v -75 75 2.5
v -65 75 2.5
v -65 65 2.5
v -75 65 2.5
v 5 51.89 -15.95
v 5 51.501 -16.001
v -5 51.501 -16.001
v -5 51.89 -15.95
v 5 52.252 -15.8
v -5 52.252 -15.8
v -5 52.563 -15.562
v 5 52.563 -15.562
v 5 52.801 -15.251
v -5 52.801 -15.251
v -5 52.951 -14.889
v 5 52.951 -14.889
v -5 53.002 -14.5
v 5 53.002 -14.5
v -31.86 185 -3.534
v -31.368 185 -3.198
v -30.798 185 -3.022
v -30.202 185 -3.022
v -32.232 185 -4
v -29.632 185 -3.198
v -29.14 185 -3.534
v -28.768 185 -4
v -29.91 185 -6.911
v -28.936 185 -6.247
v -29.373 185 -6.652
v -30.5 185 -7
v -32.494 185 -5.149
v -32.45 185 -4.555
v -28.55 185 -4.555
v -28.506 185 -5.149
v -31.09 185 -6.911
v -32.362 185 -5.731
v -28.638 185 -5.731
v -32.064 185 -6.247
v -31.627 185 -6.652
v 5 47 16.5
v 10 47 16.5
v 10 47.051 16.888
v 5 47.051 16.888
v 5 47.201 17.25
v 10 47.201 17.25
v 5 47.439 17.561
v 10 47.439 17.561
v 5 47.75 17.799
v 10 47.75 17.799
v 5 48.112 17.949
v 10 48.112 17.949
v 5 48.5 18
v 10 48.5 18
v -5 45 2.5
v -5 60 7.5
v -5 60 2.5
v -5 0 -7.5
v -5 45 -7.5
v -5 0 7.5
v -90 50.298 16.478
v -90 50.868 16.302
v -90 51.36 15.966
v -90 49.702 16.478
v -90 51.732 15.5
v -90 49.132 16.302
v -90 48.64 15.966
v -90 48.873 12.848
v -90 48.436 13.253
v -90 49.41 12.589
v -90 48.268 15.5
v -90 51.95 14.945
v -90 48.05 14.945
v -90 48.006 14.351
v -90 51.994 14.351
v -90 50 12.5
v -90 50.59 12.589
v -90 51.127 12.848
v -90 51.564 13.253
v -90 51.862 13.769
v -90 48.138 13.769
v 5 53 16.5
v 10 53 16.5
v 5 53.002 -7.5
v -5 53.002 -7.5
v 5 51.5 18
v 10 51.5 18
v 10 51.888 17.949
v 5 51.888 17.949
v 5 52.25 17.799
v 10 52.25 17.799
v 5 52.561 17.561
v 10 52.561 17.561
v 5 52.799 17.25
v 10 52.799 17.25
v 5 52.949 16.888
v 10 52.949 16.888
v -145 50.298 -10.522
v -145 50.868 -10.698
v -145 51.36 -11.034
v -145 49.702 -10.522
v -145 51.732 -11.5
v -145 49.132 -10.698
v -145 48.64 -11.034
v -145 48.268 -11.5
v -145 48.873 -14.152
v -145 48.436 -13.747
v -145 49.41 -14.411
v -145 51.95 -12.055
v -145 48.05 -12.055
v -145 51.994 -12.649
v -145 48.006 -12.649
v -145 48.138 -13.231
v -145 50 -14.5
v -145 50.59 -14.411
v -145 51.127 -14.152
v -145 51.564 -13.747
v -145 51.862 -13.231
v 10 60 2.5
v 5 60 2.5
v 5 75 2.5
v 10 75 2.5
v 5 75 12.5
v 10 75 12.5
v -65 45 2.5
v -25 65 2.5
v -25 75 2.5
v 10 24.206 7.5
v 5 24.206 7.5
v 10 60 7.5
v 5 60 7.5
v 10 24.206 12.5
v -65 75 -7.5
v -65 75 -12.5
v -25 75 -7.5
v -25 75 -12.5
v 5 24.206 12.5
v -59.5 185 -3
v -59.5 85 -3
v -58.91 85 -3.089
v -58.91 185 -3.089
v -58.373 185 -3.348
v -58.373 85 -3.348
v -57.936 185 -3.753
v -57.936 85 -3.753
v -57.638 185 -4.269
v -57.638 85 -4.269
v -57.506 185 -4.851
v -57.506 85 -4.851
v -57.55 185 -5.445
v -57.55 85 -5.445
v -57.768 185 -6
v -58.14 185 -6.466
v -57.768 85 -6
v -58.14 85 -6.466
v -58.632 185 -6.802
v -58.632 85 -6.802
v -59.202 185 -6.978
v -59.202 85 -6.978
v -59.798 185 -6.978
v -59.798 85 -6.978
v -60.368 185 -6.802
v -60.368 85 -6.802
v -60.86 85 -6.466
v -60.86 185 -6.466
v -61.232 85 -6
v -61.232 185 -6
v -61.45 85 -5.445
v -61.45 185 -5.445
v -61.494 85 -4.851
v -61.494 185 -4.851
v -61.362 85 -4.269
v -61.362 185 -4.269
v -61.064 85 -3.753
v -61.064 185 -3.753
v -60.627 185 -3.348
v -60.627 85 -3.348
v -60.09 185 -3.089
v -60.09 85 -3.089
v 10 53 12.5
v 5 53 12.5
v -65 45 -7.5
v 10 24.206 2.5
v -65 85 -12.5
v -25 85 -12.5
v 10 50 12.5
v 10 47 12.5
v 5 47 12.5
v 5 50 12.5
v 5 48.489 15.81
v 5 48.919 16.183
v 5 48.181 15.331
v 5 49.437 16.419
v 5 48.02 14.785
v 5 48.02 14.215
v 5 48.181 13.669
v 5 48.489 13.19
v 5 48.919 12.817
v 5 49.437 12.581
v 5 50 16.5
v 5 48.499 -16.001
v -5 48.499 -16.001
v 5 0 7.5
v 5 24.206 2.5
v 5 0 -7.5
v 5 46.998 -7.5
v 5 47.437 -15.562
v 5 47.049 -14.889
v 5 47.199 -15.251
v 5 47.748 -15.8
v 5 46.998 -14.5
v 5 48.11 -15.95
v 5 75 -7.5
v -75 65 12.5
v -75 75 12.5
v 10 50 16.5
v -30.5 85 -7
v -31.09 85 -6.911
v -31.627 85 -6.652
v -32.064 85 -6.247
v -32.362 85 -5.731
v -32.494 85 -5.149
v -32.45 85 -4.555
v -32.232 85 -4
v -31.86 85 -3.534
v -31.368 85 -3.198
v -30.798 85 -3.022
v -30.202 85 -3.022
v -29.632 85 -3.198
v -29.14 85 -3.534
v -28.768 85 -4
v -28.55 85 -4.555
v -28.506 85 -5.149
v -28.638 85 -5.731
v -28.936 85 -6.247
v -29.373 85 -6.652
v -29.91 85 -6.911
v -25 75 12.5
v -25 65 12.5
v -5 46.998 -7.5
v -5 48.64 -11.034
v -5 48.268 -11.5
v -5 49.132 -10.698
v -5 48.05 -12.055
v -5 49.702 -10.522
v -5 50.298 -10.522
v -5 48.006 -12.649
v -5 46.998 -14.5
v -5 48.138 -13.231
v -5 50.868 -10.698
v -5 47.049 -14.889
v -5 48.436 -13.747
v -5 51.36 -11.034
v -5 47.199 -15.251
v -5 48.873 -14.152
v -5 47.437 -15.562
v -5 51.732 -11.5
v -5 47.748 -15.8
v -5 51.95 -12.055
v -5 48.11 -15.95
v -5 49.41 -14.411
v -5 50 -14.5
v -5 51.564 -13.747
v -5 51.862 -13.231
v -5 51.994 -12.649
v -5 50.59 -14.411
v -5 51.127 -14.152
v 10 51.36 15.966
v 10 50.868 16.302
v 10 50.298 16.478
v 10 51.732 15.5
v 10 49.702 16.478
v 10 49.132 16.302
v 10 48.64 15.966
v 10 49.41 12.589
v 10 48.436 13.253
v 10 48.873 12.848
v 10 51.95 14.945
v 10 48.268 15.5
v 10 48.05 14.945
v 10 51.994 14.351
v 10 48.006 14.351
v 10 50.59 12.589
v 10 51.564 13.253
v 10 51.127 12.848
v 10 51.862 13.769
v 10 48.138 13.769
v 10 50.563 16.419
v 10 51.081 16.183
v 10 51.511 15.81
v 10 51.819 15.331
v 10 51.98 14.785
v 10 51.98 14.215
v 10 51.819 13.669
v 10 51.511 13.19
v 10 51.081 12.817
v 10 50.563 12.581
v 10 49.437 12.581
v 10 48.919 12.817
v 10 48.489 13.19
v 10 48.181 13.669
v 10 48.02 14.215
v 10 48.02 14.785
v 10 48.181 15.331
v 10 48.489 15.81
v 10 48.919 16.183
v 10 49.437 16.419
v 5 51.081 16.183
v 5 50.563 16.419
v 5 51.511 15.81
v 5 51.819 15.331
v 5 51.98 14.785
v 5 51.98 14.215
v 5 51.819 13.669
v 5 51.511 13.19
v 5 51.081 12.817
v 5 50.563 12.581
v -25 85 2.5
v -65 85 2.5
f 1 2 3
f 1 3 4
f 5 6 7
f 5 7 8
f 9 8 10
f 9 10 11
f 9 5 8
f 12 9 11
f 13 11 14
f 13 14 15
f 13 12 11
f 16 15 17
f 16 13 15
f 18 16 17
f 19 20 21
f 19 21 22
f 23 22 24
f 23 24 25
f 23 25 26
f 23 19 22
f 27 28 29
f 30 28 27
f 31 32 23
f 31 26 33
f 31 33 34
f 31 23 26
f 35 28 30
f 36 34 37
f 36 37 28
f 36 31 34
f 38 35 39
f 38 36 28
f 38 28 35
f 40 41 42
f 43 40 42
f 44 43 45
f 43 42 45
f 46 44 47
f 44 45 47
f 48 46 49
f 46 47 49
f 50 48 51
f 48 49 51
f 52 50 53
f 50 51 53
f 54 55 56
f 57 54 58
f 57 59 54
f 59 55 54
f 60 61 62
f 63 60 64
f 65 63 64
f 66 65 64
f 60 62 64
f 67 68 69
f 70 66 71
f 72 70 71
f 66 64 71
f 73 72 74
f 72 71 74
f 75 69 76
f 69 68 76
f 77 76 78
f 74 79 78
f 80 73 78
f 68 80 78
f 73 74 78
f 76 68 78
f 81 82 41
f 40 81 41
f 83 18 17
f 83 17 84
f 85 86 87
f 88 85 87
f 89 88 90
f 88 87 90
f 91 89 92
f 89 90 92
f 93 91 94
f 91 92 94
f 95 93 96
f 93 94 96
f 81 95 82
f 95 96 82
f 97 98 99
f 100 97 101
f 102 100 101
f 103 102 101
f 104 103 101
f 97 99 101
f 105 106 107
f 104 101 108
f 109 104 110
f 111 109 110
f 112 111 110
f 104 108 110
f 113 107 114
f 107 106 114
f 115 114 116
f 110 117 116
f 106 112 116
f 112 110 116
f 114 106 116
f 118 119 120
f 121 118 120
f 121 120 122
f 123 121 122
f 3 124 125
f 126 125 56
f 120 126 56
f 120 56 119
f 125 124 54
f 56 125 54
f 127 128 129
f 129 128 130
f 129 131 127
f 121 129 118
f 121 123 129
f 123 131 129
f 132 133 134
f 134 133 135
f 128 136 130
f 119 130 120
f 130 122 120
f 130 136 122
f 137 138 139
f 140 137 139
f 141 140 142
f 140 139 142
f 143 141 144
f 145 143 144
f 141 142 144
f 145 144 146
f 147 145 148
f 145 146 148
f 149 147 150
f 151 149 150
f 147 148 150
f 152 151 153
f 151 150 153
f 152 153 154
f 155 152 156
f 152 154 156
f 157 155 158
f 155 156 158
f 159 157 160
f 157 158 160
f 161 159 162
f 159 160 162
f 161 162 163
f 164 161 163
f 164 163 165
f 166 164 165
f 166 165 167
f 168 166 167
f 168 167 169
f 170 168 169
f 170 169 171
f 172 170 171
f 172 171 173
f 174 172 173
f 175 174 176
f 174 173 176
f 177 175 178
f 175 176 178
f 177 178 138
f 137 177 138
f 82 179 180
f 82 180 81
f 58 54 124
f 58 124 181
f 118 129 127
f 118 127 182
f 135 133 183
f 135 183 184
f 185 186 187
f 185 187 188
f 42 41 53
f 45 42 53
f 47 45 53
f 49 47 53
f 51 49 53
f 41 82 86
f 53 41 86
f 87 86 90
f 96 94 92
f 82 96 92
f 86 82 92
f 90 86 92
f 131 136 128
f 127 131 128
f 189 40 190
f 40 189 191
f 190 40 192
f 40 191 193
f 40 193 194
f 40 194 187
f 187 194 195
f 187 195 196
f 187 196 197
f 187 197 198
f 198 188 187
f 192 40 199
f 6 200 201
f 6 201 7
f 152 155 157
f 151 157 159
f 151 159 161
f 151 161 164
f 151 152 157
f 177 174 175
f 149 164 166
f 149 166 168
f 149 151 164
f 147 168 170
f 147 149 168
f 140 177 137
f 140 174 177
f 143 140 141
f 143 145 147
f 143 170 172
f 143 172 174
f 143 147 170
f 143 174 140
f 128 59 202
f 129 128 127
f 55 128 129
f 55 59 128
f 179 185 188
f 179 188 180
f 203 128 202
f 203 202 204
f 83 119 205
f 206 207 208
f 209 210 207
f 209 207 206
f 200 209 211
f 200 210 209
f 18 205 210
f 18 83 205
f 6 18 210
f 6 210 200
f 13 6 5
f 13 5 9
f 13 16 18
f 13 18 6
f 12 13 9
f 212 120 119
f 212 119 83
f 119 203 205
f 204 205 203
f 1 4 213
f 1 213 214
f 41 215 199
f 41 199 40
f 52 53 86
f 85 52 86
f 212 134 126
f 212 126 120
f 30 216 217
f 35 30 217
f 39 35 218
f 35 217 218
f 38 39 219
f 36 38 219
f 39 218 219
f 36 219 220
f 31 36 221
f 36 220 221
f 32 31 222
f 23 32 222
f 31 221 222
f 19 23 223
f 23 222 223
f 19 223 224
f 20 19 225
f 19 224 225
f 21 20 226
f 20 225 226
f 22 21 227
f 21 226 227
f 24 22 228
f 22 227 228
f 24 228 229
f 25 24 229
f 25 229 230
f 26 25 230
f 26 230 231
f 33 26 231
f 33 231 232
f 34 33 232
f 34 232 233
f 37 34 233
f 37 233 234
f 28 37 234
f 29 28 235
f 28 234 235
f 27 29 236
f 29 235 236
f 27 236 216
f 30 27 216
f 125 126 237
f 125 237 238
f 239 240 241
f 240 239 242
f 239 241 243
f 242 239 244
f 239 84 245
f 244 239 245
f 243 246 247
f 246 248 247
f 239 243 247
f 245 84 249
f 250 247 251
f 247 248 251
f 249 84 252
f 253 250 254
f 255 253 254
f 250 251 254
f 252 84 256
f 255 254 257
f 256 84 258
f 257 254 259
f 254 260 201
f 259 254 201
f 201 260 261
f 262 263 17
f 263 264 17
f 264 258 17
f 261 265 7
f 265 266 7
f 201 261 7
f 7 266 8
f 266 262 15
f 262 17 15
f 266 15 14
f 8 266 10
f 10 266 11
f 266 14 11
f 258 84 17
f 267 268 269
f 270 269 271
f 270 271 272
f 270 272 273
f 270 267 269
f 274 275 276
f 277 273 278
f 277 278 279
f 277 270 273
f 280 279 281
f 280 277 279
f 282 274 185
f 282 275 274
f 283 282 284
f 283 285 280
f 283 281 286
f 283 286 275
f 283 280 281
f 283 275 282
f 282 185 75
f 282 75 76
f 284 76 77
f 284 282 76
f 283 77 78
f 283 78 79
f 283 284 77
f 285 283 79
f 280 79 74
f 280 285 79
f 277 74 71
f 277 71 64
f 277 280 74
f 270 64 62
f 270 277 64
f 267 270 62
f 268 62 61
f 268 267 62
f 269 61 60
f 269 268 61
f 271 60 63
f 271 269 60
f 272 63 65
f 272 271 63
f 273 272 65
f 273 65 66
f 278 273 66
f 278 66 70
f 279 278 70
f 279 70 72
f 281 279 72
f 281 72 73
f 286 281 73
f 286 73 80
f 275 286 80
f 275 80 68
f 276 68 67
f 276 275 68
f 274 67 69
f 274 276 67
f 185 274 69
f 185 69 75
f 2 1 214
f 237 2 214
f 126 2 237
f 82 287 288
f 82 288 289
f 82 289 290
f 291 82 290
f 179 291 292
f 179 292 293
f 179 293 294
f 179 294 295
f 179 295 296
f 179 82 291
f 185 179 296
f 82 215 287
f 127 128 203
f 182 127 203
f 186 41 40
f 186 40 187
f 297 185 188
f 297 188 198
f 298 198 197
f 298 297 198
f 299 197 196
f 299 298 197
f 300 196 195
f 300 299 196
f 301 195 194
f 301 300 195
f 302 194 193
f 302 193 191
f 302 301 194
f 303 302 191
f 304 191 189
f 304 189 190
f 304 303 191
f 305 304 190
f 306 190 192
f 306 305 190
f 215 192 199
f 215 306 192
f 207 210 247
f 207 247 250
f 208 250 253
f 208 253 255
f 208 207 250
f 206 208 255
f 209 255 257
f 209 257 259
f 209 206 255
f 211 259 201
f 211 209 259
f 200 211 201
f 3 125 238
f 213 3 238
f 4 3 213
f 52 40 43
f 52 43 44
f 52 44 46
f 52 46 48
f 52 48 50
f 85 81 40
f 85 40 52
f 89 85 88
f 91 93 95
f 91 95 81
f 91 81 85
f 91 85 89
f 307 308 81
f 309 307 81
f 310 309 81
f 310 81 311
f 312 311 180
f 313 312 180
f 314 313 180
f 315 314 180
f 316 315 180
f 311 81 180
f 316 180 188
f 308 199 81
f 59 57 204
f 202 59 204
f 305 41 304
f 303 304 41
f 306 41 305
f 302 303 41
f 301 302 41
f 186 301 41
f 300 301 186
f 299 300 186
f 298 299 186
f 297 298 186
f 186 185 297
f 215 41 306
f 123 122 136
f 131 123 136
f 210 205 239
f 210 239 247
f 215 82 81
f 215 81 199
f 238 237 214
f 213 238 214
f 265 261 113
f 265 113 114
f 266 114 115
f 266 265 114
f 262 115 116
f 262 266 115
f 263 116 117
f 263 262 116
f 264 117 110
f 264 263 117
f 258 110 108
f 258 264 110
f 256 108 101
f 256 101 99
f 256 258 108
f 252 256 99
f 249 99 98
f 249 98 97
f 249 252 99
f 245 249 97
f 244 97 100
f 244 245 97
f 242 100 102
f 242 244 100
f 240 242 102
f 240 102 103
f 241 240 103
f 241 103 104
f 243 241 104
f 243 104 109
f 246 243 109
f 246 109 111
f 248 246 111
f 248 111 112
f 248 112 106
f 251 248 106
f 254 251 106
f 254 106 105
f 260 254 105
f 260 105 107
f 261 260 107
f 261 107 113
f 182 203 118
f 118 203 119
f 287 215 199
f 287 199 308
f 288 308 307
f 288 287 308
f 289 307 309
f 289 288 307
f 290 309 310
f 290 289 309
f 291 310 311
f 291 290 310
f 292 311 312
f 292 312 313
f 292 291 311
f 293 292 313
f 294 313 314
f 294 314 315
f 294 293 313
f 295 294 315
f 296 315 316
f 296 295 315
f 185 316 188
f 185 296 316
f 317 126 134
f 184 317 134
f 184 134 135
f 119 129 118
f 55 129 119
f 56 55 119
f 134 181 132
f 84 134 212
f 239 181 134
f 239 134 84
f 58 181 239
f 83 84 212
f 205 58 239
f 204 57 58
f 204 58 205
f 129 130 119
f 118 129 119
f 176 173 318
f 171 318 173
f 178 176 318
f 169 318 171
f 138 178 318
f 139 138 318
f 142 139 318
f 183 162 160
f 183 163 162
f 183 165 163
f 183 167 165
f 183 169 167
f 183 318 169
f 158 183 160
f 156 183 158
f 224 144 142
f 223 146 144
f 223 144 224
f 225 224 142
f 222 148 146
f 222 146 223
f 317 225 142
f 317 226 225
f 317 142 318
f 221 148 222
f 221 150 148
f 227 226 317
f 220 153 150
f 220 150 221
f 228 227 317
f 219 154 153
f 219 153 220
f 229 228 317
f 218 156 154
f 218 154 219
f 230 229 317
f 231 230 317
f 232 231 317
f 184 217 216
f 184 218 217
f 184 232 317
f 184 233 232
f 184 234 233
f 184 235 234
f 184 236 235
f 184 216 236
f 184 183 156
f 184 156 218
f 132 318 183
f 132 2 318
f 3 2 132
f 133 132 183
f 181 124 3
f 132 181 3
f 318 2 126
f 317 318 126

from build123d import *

# Parameters (mm, degrees)
SKETCH1_W              = 10
SKETCH1_H              = 15
BOSS_EXTRUDE1_DEPTH    = 60
SKETCH2_W              = 10
SKETCH2_H              = 15
BOSS_EXTRUDE2_DEPTH    = 60
SKETCH3_W              = 70
SKETCH3_H              = 10
BOSS_EXTRUDE3_DEPTH    = 15
SKETCH6_W              = 40
SKETCH6_H              = 15
BOSS_EXTRUDE4_DEPTH    = 10
SKETCH7_R              = 2
BOSS_EXTRUDE5_DEPTH    = 100
BOSS_EXTRUDE6_DEPTH    = 10
SKETCH10_W             = 5
SKETCH10_H             = 35.794380654
BOSS_EXTRUDE12_DEPTH   = 5
BOSS_EXTRUDE15_DEPTH   = 5
SKETCH19_R             = 2
BOSS_EXTRUDE18_DEPTH   = 150
BOSS_EXTRUDE19_DEPTH   = 10
SKETCH26_R             = 2
BOSS_EXTRUDE22_DEPTH   = 100
BOSS_EXTRUDE31_DEPTH   = 5
BOSS_EXTRUDE31_2_DEPTH = 5
BOSS_EXTRUDE33_DEPTH   = 5


with BuildPart() as part:
    # Sketch1 → Boss-Extrude1 (new body)
    with BuildSketch(Plane(origin=(0, 0, 0), x_dir=(1, 0, 0), z_dir=(0, 1, 0))):
        Rectangle(SKETCH1_W, SKETCH1_H)
    extrude(amount=BOSS_EXTRUDE1_DEPTH)

    # Sketch2 → Boss-Extrude2 (add)
    with BuildSketch(Plane(origin=(-5, 0, 0), x_dir=(0, 0, -1), z_dir=(1, 0, 0))):
        with Locations((2.5, 52.5)):
            Rectangle(SKETCH2_W, SKETCH2_H)
    extrude(amount=-BOSS_EXTRUDE2_DEPTH)

    # Sketch3 → Boss-Extrude3 (add)
    with BuildSketch(Plane(origin=(0, 60, 0), x_dir=(1, 0, 0), z_dir=(0, 1, 0))):
        with Locations((-30, 2.5)):
            Rectangle(SKETCH3_W, SKETCH3_H)
    extrude(amount=BOSS_EXTRUDE3_DEPTH)

    # Sketch6 → Boss-Extrude4 (add)
    with BuildSketch(Plane(origin=(0, 75, 0), x_dir=(1, 0, 0), z_dir=(0, 1, 0))):
        with Locations((-45, 5)):
            Rectangle(SKETCH6_W, SKETCH6_H)
    extrude(amount=BOSS_EXTRUDE4_DEPTH)

    # Sketch7 → Boss-Extrude5 (add)
    with BuildSketch(Plane(origin=(0, 85, 0), x_dir=(1, 0, 0), z_dir=(0, 1, 0))):
        with Locations(Location((-30.5, 5, 0), (0, 0, 90))):
            Circle(SKETCH7_R)
        with Locations(Location((-59.5, 5, 0), (0, 0, 270))):
            Circle(SKETCH7_R)
    extrude(amount=BOSS_EXTRUDE5_DEPTH)

    # Sketch8 → Boss-Extrude6 (add)
    with BuildSketch(Plane(origin=(5, 75, 2.5), x_dir=(-1, 0, 0), z_dir=(0, 0, -1))):
        Polygon((30, 0), (30, -10), (70, -10), (80, -10), (80, 0), align=None)
    extrude(amount=-BOSS_EXTRUDE6_DEPTH)

    # Sketch10 → Boss-Extrude12 (add)
    with BuildSketch(Plane(origin=(5, 0, 0), x_dir=(0, 0, -1), z_dir=(1, 0, 0))):
        with Locations((-5, 42.102809673)):
            Rectangle(SKETCH10_W, SKETCH10_H)
    extrude(amount=BOSS_EXTRUDE12_DEPTH)



with BuildPart() as body_2:
    # Sketch11 → Boss-Extrude15 (new body)
    with BuildSketch(Plane(origin=(5, 0, 0), x_dir=(0, 0, -1), z_dir=(1, 0, 0))):
        Polygon((-2.5, 60), (-2.5, 75), (-12.5, 75), (-12.5, 24.205619346), (-7.5, 24.205619346), (-7.5, 60), align=None)
    extrude(amount=BOSS_EXTRUDE15_DEPTH)


with BuildPart() as body_3:
    # Sketch19 → Boss-Extrude18 (new body)
    with BuildSketch(Plane(origin=(5, 0, 0), x_dir=(0, 0, -1), z_dir=(1, 0, 0))):
        with Locations((12.5, 50)):
            Circle(SKETCH19_R)
    extrude(amount=-BOSS_EXTRUDE18_DEPTH)


with BuildPart() as part_1:
    add(part.part)

    add(body_3.part)  # Boss-Extrude19 merges body 3
    # Sketch20 → Boss-Extrude19 (add)
    with BuildSketch(Plane(origin=(5, 0, 0), x_dir=(0, 0, -1), z_dir=(1, 0, 0))):
        with BuildLine():
            Line((12.5, 53.002424106), (7.5, 53.002424106))
            Line((7.5, 53.002424106), (7.5, 50))
            Line((7.5, 50), (7.5, 46.997575894))
            Line((7.5, 46.997575894), (12.5, 46.997575894))
            Line((12.5, 46.997575894), (14.5, 46.997575894))
            ThreePointArc((14.5, 46.997575894), (15.561517223, 47.437270724), (16.001212053, 48.498787947))
            Line((16.001212053, 48.498787947), (16.001212053, 51.501212053))
            ThreePointArc((16.001212053, 51.501212053), (15.561517223, 52.562729276), (14.5, 53.002424106))
            Line((14.5, 53.002424106), (12.5, 53.002424106))
        make_face()
    extrude(amount=-BOSS_EXTRUDE19_DEPTH)


with BuildPart() as body_3_2:
    # Sketch26 → Boss-Extrude22 (new body)
    with BuildSketch(Plane(origin=(10, 0, 0), x_dir=(0, 0, -1), z_dir=(1, 0, 0))):
        with Locations((-14.5, 50)):
            Circle(SKETCH26_R)
    extrude(amount=-BOSS_EXTRUDE22_DEPTH)


with BuildPart() as body_4:
    # Sketch33 → Boss-Extrude31 (new body)
    with BuildSketch(Plane(origin=(10, 0, 0), x_dir=(0, 0, -1), z_dir=(1, 0, 0))):
        with BuildLine():
            Line((-12.5, 50), (-12.5, 53))
            Line((-12.5, 53), (-16.5, 53))
            Line((-16.5, 53), (-16.5, 50))
            ThreePointArc((-16.5, 50), (-14.5, 52), (-12.5, 50))
        make_face()
    extrude(amount=-BOSS_EXTRUDE31_DEPTH)


with BuildPart() as body_5:
    # Sketch33 → Boss-Extrude31 2 (new body)
    with BuildSketch(Plane(origin=(10, 0, 0), x_dir=(0, 0, -1), z_dir=(1, 0, 0))):
        with BuildLine():
            Line((-12.5, 47), (-12.5, 50))
            ThreePointArc((-12.5, 50), (-14.5, 48), (-16.5, 50))
            Line((-16.5, 50), (-16.5, 47))
            Line((-16.5, 47), (-12.5, 47))
        make_face()
    extrude(amount=-BOSS_EXTRUDE31_2_DEPTH)


with BuildPart() as body_6:
    # Sketch36 → Boss-Extrude33 (new body)
    with BuildSketch(Plane(origin=(10, 0, 0), x_dir=(0, 0, -1), z_dir=(1, 0, 0))):
        with BuildLine():
            Line((-18, 48.5), (-18, 51.5))
            ThreePointArc((-18, 51.5), (-17.560660172, 52.560660172), (-16.5, 53))
            Line((-16.5, 53), (-16.5, 47))
            ThreePointArc((-16.5, 47), (-17.560660172, 47.439339828), (-18, 48.5))
        make_face()
    extrude(amount=-BOSS_EXTRUDE33_DEPTH)


solid = Compound([body_2.part, part_1.part, body_3_2.part, body_4.part, body_5.part, body_6.part])
